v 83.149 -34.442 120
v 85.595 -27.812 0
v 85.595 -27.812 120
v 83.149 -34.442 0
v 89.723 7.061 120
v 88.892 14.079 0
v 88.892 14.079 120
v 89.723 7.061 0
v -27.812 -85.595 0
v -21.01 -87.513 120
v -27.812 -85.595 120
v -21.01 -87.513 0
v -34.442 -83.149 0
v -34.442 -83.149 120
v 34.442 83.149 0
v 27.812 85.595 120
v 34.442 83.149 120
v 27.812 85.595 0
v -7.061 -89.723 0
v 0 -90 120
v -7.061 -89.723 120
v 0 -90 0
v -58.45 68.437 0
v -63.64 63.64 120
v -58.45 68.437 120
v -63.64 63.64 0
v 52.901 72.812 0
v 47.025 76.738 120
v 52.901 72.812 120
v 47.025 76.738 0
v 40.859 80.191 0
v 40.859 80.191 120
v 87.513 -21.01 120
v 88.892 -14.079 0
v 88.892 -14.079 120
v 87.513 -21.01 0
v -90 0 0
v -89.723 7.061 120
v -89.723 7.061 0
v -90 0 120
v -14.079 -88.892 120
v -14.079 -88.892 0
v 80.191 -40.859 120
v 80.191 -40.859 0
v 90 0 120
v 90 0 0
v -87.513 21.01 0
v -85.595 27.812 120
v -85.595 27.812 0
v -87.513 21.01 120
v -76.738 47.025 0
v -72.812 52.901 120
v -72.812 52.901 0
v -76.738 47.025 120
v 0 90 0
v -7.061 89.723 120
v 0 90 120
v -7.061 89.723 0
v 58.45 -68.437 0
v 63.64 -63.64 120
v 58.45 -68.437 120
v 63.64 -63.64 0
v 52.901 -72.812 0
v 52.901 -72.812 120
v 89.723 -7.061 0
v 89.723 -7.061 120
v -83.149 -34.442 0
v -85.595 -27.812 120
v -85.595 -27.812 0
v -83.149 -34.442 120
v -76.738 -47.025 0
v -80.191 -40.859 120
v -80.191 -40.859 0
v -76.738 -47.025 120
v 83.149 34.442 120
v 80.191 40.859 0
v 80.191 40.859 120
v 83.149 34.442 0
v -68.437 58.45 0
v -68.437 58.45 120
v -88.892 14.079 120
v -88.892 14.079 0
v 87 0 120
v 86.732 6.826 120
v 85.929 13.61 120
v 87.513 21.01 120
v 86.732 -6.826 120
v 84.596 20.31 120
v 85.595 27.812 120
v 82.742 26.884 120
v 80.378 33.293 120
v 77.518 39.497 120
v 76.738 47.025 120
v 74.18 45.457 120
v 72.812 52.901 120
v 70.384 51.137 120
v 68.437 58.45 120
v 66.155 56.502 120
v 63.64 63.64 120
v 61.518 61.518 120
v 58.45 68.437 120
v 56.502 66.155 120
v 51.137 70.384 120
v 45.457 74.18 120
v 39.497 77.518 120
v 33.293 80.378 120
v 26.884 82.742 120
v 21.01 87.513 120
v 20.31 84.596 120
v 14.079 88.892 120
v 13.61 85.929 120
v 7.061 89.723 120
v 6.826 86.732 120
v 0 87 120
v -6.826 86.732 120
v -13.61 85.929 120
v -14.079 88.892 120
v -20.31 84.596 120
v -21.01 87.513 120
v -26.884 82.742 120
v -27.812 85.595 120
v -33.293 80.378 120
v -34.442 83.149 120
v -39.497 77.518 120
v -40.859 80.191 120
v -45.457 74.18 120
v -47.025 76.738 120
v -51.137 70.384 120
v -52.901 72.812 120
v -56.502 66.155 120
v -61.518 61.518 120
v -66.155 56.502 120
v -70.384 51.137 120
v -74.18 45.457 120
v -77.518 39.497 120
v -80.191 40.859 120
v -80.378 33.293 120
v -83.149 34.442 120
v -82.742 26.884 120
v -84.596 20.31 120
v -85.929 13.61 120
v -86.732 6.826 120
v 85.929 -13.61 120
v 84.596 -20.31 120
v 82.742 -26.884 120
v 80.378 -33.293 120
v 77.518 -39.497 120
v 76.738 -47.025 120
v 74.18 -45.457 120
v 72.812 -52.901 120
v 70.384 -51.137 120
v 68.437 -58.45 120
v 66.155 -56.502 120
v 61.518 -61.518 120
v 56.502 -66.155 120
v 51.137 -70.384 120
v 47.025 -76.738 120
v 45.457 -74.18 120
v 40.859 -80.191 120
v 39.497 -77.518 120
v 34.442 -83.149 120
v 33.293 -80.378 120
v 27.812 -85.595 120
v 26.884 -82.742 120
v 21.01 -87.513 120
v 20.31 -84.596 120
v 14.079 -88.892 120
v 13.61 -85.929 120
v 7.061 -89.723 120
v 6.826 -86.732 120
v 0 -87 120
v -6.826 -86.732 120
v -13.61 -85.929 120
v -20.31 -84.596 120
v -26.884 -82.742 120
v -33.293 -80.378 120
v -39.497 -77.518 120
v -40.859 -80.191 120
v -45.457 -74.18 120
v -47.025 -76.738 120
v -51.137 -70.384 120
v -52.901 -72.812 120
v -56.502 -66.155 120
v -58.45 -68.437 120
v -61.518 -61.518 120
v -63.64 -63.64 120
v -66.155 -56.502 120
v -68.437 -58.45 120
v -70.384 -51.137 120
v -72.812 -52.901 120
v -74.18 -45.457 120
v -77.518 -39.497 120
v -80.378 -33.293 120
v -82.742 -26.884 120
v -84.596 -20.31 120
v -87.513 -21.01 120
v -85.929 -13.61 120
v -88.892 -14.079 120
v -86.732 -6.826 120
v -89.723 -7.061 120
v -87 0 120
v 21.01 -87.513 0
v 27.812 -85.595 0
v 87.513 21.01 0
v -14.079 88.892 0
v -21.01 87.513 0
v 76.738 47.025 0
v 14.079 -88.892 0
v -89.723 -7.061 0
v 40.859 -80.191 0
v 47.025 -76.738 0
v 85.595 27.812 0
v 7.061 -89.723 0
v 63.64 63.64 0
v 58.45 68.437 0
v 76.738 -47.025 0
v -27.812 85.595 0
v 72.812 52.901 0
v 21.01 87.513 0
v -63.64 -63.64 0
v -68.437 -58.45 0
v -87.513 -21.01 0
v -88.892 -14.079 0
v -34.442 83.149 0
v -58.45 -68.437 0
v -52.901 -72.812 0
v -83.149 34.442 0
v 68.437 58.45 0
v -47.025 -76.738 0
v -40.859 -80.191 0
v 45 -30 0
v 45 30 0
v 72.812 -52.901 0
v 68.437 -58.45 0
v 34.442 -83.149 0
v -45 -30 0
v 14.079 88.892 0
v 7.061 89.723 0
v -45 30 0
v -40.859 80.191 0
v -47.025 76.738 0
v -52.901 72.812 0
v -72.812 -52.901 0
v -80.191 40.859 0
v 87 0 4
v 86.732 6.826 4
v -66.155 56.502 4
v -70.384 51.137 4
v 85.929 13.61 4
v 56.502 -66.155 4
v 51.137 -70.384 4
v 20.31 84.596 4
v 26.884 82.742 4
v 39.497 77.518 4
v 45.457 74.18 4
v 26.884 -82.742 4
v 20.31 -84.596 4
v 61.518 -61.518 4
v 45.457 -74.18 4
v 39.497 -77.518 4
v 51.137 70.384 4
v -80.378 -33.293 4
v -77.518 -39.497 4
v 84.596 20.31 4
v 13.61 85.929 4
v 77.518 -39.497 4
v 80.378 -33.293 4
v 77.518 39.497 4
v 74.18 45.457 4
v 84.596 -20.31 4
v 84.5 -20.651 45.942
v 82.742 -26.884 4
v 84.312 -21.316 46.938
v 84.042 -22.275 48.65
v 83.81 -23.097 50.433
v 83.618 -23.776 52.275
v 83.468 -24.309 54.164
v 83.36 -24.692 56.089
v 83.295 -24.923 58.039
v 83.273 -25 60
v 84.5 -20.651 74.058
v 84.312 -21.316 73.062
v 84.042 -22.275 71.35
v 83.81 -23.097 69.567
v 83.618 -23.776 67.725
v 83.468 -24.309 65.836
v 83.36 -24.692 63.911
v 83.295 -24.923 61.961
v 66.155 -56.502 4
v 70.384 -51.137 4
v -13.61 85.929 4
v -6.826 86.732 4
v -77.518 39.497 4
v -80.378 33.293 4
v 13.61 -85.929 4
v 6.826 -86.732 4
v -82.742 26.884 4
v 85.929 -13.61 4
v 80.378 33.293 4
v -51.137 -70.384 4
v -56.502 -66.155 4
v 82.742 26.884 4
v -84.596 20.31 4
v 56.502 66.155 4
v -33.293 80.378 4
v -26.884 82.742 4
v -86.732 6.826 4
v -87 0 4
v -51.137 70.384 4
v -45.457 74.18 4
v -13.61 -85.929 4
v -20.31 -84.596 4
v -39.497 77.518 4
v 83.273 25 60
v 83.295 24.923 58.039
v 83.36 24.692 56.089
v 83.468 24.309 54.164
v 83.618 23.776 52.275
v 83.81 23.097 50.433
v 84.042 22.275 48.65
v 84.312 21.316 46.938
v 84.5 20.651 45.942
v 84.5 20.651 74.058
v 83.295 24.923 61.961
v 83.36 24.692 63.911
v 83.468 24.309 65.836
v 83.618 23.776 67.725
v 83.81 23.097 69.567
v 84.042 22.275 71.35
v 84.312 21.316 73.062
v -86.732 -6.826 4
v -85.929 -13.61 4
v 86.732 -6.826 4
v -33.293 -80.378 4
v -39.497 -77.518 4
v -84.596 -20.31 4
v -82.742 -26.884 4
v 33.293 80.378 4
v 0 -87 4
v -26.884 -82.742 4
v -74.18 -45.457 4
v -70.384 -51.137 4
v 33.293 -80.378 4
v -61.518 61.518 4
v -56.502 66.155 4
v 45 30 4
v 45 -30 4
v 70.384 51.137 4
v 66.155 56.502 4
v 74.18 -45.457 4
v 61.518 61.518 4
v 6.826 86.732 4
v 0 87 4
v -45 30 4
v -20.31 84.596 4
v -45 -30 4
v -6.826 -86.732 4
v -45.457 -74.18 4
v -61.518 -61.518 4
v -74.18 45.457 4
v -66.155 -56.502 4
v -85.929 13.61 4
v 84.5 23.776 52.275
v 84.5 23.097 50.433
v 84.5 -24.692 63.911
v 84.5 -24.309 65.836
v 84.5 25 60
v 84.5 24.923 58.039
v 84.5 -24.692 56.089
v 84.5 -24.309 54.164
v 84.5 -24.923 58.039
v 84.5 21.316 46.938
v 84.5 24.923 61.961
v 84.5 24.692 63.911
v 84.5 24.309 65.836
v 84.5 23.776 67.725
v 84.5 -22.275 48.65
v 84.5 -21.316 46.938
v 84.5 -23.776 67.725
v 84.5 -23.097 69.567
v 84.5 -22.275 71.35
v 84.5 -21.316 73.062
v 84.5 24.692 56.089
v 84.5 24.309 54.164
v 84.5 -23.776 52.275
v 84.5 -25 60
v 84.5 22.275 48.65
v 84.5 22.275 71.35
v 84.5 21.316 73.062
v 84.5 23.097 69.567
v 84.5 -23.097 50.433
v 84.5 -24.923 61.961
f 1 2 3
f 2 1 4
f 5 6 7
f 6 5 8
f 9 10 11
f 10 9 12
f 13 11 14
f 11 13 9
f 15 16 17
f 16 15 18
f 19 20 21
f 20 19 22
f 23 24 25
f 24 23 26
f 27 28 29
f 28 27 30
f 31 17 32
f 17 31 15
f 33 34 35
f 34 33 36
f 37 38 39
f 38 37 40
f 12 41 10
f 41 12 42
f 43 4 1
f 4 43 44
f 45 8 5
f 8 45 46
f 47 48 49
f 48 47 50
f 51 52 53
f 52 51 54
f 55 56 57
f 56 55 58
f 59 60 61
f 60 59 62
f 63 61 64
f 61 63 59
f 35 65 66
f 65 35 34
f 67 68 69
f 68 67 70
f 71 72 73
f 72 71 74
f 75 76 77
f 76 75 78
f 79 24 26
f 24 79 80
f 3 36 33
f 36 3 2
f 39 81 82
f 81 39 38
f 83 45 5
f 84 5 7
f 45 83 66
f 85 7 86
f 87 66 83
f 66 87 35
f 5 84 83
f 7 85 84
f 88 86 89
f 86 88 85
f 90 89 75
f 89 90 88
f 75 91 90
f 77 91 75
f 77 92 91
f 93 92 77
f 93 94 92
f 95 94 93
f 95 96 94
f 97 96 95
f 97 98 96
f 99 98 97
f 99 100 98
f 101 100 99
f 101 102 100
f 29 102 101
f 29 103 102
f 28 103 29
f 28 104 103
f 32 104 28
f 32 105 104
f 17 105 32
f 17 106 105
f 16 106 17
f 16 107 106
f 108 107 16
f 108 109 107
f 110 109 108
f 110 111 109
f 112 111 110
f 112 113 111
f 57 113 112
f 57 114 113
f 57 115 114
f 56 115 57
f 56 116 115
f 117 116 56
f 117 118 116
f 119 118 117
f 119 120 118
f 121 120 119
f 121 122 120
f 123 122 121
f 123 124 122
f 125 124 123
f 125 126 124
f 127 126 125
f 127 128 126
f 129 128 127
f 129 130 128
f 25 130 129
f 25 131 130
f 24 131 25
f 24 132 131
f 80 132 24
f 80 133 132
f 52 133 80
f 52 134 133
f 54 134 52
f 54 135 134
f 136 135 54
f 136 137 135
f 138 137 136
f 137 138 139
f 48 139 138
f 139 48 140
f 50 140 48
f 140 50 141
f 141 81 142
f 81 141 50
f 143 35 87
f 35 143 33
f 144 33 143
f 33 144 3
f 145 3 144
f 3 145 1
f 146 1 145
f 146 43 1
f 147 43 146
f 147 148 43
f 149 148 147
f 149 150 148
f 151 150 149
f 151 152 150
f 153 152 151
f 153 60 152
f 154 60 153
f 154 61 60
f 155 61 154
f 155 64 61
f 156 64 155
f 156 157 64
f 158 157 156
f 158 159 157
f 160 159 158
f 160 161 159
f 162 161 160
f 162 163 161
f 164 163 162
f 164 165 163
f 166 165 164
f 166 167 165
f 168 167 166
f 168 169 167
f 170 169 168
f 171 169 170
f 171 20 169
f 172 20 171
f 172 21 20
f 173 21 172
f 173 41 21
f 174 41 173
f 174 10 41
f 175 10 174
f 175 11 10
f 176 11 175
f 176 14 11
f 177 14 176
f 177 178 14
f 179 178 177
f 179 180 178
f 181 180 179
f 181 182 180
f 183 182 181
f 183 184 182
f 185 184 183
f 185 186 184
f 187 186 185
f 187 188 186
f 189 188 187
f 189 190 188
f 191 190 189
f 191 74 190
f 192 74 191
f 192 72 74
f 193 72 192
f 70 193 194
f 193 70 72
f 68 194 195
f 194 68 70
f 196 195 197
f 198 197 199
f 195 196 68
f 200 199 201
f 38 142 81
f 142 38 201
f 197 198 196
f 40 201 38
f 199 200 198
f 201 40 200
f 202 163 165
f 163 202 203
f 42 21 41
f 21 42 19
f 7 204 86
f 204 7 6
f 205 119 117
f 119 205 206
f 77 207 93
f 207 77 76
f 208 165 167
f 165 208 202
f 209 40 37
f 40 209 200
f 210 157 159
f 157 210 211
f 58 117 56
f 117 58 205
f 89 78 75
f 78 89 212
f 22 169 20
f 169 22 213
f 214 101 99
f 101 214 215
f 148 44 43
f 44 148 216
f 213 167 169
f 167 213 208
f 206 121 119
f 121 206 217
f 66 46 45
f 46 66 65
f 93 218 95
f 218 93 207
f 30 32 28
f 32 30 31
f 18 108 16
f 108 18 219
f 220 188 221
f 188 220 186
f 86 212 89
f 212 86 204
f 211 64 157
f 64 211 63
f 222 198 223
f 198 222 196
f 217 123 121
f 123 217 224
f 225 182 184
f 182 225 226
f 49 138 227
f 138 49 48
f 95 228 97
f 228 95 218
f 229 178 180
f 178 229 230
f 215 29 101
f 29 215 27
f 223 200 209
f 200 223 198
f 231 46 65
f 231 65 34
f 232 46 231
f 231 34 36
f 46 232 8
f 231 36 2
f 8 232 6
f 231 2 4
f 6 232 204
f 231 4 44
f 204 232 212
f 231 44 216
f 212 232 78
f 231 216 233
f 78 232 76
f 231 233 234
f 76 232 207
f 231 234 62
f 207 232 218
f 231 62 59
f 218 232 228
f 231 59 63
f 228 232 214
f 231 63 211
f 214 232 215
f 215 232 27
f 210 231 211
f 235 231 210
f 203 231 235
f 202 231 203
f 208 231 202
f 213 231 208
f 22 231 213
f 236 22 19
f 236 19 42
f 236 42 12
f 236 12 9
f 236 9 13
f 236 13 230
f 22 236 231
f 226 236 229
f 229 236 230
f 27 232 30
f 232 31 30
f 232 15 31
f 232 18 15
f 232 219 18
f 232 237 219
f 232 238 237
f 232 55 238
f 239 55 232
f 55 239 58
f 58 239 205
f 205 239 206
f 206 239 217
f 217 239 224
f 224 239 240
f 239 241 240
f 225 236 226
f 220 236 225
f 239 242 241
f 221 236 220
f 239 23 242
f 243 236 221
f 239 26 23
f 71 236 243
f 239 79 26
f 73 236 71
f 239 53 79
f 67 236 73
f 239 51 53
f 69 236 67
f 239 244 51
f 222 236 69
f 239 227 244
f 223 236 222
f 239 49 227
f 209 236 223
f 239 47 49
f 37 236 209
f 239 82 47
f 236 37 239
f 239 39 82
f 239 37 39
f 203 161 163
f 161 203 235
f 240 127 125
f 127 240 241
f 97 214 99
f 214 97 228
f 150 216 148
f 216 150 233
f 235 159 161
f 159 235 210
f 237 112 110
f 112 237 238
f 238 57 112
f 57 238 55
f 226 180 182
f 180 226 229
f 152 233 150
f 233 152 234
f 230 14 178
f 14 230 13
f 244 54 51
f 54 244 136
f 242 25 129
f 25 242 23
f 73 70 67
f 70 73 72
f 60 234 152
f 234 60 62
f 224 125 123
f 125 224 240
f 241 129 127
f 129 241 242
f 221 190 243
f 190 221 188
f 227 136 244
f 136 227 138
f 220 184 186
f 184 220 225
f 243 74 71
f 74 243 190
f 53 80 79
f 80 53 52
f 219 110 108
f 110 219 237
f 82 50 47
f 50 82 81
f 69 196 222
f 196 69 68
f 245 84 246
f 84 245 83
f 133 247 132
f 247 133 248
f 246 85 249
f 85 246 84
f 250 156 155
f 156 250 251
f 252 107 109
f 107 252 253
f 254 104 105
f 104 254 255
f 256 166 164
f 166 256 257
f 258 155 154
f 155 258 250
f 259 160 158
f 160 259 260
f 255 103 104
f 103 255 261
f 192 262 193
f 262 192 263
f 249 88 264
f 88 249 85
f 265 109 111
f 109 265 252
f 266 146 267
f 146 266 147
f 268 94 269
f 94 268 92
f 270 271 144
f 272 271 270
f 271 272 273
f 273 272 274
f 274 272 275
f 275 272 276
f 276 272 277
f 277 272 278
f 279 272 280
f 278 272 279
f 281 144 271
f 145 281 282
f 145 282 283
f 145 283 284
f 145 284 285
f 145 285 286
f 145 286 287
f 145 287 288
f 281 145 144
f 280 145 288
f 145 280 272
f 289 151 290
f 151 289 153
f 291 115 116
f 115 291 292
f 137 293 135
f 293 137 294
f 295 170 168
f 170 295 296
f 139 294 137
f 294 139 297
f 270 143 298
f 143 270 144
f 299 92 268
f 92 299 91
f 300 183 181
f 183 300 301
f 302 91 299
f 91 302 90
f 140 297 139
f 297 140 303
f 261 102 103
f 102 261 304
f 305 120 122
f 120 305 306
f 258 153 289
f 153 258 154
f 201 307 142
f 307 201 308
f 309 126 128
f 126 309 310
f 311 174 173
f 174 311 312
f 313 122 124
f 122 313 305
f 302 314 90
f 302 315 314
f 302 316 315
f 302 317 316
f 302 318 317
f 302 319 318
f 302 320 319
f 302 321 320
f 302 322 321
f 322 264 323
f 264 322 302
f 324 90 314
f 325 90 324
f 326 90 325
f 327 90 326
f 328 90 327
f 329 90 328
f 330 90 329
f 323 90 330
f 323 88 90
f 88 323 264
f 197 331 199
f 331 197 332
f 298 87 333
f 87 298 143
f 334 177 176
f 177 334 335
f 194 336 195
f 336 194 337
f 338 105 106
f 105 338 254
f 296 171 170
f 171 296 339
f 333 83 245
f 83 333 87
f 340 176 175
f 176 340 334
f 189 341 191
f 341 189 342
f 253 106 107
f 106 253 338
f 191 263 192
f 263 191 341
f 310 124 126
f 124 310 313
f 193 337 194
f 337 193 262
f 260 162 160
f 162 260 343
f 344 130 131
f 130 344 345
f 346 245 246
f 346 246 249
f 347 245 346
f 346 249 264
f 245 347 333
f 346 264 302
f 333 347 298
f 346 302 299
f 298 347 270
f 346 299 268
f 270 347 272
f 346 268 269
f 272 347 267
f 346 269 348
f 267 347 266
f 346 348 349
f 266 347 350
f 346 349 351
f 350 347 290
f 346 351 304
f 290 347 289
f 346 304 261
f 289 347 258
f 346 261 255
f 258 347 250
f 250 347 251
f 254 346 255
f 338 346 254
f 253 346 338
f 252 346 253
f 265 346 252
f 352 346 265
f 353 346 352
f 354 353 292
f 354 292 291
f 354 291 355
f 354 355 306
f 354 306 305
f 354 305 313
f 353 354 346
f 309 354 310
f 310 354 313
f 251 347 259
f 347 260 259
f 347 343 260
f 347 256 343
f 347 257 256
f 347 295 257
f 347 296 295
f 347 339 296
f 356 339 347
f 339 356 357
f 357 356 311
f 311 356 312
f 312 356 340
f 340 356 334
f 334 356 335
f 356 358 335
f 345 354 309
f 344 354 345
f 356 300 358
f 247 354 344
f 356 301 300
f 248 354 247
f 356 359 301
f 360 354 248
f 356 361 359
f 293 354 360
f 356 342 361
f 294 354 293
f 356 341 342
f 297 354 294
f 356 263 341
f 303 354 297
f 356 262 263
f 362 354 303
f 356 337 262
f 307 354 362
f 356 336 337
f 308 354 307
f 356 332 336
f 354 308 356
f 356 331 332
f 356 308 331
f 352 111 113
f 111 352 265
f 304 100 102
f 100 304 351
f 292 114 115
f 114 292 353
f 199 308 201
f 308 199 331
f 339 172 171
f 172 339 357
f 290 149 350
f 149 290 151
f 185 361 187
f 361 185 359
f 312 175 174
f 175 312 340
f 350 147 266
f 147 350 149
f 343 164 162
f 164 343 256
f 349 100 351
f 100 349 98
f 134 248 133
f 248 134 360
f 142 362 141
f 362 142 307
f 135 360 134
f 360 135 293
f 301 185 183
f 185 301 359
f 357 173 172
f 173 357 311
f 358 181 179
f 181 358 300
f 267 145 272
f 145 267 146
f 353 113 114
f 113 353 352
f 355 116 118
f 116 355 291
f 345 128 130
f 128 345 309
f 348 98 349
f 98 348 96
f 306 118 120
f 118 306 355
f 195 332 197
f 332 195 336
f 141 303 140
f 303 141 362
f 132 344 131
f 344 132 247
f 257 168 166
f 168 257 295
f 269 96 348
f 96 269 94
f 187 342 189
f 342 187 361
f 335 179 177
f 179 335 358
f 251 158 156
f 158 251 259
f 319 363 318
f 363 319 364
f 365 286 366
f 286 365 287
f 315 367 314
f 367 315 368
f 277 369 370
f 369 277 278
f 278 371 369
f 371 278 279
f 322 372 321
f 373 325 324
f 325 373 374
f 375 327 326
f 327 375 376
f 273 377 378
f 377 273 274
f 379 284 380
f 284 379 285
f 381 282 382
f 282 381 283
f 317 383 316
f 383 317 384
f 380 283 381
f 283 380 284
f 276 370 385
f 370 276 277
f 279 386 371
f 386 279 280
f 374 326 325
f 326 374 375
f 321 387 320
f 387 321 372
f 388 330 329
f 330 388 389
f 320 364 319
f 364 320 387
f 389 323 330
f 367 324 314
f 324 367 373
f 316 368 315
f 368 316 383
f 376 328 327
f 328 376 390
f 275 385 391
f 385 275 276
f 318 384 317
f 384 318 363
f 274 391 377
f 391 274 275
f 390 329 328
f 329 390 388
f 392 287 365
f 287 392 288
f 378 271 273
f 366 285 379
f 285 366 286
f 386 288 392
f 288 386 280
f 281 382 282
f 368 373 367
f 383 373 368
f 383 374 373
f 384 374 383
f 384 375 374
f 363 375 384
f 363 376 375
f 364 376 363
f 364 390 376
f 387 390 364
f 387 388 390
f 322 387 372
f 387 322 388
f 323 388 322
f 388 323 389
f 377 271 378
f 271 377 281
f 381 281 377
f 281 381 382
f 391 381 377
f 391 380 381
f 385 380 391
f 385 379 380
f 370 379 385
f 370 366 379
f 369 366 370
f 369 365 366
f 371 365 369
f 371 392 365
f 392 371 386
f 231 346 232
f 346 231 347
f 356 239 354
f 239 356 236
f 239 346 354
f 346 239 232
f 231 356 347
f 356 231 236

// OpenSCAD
// Scout assistive robot enclosure — parametric OpenSCAD
// Export: openscad -o scout-body-shell.stl scout-body.scad
// Adjust variables below for your chassis

$fn = 80;

// --- parameters ---
body_diameter = 180;
shell_height = 120;
wall = 3;
base_thick = 4;
speaker_d = 50;
mic_d = 8;
pi_len = 90;
pi_wid = 60;

// --- main shell (upper) ---
module shell() {
  difference() {
    cylinder(h = shell_height, d = body_diameter);
    translate([0, 0, base_thick])
      cylinder(h = shell_height, d = body_diameter - wall * 2);
    // speaker grille (front)
    translate([body_diameter / 2 - wall - 5, 0, shell_height / 2])
      rotate([0, 90, 0])
        cylinder(h = wall + 2, d = speaker_d, center = true);
    // mic hole (top)
    translate([0, 0, shell_height - 5])
      cylinder(h = 10, d = mic_d, center = true);
    // pi bay
    translate([0, 0, base_thick + 2])
      cube([pi_len, pi_wid, 30], center = true);
  }
}

// --- base plate ---
module base_plate() {
  difference() {
    cylinder(h = base_thick, d = body_diameter);
    // motor wire notch
    translate([0, -body_diameter / 2 + 10, 0])
      cube([30, 20, base_thick + 1], center = true);
    // mounting holes (M3)
    for (a = [45, 135, 225, 315])
      rotate([0, 0, a])
        translate([body_diameter / 2 - 15, 0, 0])
          cylinder(h = base_thick + 1, d = 3.2, center = false);
  }
}

// --- front bumper clip ---
module bumper() {
  difference() {
    translate([-40, -5, 0])
      cube([80, 10, 15]);
    translate([0, 0, 3])
      cube([70, 12, 10], center = true);
  }
}

// Default export: shell only (change module call for other parts)
shell();

// Uncomment to preview other parts:
// base_plate();
// bumper();
